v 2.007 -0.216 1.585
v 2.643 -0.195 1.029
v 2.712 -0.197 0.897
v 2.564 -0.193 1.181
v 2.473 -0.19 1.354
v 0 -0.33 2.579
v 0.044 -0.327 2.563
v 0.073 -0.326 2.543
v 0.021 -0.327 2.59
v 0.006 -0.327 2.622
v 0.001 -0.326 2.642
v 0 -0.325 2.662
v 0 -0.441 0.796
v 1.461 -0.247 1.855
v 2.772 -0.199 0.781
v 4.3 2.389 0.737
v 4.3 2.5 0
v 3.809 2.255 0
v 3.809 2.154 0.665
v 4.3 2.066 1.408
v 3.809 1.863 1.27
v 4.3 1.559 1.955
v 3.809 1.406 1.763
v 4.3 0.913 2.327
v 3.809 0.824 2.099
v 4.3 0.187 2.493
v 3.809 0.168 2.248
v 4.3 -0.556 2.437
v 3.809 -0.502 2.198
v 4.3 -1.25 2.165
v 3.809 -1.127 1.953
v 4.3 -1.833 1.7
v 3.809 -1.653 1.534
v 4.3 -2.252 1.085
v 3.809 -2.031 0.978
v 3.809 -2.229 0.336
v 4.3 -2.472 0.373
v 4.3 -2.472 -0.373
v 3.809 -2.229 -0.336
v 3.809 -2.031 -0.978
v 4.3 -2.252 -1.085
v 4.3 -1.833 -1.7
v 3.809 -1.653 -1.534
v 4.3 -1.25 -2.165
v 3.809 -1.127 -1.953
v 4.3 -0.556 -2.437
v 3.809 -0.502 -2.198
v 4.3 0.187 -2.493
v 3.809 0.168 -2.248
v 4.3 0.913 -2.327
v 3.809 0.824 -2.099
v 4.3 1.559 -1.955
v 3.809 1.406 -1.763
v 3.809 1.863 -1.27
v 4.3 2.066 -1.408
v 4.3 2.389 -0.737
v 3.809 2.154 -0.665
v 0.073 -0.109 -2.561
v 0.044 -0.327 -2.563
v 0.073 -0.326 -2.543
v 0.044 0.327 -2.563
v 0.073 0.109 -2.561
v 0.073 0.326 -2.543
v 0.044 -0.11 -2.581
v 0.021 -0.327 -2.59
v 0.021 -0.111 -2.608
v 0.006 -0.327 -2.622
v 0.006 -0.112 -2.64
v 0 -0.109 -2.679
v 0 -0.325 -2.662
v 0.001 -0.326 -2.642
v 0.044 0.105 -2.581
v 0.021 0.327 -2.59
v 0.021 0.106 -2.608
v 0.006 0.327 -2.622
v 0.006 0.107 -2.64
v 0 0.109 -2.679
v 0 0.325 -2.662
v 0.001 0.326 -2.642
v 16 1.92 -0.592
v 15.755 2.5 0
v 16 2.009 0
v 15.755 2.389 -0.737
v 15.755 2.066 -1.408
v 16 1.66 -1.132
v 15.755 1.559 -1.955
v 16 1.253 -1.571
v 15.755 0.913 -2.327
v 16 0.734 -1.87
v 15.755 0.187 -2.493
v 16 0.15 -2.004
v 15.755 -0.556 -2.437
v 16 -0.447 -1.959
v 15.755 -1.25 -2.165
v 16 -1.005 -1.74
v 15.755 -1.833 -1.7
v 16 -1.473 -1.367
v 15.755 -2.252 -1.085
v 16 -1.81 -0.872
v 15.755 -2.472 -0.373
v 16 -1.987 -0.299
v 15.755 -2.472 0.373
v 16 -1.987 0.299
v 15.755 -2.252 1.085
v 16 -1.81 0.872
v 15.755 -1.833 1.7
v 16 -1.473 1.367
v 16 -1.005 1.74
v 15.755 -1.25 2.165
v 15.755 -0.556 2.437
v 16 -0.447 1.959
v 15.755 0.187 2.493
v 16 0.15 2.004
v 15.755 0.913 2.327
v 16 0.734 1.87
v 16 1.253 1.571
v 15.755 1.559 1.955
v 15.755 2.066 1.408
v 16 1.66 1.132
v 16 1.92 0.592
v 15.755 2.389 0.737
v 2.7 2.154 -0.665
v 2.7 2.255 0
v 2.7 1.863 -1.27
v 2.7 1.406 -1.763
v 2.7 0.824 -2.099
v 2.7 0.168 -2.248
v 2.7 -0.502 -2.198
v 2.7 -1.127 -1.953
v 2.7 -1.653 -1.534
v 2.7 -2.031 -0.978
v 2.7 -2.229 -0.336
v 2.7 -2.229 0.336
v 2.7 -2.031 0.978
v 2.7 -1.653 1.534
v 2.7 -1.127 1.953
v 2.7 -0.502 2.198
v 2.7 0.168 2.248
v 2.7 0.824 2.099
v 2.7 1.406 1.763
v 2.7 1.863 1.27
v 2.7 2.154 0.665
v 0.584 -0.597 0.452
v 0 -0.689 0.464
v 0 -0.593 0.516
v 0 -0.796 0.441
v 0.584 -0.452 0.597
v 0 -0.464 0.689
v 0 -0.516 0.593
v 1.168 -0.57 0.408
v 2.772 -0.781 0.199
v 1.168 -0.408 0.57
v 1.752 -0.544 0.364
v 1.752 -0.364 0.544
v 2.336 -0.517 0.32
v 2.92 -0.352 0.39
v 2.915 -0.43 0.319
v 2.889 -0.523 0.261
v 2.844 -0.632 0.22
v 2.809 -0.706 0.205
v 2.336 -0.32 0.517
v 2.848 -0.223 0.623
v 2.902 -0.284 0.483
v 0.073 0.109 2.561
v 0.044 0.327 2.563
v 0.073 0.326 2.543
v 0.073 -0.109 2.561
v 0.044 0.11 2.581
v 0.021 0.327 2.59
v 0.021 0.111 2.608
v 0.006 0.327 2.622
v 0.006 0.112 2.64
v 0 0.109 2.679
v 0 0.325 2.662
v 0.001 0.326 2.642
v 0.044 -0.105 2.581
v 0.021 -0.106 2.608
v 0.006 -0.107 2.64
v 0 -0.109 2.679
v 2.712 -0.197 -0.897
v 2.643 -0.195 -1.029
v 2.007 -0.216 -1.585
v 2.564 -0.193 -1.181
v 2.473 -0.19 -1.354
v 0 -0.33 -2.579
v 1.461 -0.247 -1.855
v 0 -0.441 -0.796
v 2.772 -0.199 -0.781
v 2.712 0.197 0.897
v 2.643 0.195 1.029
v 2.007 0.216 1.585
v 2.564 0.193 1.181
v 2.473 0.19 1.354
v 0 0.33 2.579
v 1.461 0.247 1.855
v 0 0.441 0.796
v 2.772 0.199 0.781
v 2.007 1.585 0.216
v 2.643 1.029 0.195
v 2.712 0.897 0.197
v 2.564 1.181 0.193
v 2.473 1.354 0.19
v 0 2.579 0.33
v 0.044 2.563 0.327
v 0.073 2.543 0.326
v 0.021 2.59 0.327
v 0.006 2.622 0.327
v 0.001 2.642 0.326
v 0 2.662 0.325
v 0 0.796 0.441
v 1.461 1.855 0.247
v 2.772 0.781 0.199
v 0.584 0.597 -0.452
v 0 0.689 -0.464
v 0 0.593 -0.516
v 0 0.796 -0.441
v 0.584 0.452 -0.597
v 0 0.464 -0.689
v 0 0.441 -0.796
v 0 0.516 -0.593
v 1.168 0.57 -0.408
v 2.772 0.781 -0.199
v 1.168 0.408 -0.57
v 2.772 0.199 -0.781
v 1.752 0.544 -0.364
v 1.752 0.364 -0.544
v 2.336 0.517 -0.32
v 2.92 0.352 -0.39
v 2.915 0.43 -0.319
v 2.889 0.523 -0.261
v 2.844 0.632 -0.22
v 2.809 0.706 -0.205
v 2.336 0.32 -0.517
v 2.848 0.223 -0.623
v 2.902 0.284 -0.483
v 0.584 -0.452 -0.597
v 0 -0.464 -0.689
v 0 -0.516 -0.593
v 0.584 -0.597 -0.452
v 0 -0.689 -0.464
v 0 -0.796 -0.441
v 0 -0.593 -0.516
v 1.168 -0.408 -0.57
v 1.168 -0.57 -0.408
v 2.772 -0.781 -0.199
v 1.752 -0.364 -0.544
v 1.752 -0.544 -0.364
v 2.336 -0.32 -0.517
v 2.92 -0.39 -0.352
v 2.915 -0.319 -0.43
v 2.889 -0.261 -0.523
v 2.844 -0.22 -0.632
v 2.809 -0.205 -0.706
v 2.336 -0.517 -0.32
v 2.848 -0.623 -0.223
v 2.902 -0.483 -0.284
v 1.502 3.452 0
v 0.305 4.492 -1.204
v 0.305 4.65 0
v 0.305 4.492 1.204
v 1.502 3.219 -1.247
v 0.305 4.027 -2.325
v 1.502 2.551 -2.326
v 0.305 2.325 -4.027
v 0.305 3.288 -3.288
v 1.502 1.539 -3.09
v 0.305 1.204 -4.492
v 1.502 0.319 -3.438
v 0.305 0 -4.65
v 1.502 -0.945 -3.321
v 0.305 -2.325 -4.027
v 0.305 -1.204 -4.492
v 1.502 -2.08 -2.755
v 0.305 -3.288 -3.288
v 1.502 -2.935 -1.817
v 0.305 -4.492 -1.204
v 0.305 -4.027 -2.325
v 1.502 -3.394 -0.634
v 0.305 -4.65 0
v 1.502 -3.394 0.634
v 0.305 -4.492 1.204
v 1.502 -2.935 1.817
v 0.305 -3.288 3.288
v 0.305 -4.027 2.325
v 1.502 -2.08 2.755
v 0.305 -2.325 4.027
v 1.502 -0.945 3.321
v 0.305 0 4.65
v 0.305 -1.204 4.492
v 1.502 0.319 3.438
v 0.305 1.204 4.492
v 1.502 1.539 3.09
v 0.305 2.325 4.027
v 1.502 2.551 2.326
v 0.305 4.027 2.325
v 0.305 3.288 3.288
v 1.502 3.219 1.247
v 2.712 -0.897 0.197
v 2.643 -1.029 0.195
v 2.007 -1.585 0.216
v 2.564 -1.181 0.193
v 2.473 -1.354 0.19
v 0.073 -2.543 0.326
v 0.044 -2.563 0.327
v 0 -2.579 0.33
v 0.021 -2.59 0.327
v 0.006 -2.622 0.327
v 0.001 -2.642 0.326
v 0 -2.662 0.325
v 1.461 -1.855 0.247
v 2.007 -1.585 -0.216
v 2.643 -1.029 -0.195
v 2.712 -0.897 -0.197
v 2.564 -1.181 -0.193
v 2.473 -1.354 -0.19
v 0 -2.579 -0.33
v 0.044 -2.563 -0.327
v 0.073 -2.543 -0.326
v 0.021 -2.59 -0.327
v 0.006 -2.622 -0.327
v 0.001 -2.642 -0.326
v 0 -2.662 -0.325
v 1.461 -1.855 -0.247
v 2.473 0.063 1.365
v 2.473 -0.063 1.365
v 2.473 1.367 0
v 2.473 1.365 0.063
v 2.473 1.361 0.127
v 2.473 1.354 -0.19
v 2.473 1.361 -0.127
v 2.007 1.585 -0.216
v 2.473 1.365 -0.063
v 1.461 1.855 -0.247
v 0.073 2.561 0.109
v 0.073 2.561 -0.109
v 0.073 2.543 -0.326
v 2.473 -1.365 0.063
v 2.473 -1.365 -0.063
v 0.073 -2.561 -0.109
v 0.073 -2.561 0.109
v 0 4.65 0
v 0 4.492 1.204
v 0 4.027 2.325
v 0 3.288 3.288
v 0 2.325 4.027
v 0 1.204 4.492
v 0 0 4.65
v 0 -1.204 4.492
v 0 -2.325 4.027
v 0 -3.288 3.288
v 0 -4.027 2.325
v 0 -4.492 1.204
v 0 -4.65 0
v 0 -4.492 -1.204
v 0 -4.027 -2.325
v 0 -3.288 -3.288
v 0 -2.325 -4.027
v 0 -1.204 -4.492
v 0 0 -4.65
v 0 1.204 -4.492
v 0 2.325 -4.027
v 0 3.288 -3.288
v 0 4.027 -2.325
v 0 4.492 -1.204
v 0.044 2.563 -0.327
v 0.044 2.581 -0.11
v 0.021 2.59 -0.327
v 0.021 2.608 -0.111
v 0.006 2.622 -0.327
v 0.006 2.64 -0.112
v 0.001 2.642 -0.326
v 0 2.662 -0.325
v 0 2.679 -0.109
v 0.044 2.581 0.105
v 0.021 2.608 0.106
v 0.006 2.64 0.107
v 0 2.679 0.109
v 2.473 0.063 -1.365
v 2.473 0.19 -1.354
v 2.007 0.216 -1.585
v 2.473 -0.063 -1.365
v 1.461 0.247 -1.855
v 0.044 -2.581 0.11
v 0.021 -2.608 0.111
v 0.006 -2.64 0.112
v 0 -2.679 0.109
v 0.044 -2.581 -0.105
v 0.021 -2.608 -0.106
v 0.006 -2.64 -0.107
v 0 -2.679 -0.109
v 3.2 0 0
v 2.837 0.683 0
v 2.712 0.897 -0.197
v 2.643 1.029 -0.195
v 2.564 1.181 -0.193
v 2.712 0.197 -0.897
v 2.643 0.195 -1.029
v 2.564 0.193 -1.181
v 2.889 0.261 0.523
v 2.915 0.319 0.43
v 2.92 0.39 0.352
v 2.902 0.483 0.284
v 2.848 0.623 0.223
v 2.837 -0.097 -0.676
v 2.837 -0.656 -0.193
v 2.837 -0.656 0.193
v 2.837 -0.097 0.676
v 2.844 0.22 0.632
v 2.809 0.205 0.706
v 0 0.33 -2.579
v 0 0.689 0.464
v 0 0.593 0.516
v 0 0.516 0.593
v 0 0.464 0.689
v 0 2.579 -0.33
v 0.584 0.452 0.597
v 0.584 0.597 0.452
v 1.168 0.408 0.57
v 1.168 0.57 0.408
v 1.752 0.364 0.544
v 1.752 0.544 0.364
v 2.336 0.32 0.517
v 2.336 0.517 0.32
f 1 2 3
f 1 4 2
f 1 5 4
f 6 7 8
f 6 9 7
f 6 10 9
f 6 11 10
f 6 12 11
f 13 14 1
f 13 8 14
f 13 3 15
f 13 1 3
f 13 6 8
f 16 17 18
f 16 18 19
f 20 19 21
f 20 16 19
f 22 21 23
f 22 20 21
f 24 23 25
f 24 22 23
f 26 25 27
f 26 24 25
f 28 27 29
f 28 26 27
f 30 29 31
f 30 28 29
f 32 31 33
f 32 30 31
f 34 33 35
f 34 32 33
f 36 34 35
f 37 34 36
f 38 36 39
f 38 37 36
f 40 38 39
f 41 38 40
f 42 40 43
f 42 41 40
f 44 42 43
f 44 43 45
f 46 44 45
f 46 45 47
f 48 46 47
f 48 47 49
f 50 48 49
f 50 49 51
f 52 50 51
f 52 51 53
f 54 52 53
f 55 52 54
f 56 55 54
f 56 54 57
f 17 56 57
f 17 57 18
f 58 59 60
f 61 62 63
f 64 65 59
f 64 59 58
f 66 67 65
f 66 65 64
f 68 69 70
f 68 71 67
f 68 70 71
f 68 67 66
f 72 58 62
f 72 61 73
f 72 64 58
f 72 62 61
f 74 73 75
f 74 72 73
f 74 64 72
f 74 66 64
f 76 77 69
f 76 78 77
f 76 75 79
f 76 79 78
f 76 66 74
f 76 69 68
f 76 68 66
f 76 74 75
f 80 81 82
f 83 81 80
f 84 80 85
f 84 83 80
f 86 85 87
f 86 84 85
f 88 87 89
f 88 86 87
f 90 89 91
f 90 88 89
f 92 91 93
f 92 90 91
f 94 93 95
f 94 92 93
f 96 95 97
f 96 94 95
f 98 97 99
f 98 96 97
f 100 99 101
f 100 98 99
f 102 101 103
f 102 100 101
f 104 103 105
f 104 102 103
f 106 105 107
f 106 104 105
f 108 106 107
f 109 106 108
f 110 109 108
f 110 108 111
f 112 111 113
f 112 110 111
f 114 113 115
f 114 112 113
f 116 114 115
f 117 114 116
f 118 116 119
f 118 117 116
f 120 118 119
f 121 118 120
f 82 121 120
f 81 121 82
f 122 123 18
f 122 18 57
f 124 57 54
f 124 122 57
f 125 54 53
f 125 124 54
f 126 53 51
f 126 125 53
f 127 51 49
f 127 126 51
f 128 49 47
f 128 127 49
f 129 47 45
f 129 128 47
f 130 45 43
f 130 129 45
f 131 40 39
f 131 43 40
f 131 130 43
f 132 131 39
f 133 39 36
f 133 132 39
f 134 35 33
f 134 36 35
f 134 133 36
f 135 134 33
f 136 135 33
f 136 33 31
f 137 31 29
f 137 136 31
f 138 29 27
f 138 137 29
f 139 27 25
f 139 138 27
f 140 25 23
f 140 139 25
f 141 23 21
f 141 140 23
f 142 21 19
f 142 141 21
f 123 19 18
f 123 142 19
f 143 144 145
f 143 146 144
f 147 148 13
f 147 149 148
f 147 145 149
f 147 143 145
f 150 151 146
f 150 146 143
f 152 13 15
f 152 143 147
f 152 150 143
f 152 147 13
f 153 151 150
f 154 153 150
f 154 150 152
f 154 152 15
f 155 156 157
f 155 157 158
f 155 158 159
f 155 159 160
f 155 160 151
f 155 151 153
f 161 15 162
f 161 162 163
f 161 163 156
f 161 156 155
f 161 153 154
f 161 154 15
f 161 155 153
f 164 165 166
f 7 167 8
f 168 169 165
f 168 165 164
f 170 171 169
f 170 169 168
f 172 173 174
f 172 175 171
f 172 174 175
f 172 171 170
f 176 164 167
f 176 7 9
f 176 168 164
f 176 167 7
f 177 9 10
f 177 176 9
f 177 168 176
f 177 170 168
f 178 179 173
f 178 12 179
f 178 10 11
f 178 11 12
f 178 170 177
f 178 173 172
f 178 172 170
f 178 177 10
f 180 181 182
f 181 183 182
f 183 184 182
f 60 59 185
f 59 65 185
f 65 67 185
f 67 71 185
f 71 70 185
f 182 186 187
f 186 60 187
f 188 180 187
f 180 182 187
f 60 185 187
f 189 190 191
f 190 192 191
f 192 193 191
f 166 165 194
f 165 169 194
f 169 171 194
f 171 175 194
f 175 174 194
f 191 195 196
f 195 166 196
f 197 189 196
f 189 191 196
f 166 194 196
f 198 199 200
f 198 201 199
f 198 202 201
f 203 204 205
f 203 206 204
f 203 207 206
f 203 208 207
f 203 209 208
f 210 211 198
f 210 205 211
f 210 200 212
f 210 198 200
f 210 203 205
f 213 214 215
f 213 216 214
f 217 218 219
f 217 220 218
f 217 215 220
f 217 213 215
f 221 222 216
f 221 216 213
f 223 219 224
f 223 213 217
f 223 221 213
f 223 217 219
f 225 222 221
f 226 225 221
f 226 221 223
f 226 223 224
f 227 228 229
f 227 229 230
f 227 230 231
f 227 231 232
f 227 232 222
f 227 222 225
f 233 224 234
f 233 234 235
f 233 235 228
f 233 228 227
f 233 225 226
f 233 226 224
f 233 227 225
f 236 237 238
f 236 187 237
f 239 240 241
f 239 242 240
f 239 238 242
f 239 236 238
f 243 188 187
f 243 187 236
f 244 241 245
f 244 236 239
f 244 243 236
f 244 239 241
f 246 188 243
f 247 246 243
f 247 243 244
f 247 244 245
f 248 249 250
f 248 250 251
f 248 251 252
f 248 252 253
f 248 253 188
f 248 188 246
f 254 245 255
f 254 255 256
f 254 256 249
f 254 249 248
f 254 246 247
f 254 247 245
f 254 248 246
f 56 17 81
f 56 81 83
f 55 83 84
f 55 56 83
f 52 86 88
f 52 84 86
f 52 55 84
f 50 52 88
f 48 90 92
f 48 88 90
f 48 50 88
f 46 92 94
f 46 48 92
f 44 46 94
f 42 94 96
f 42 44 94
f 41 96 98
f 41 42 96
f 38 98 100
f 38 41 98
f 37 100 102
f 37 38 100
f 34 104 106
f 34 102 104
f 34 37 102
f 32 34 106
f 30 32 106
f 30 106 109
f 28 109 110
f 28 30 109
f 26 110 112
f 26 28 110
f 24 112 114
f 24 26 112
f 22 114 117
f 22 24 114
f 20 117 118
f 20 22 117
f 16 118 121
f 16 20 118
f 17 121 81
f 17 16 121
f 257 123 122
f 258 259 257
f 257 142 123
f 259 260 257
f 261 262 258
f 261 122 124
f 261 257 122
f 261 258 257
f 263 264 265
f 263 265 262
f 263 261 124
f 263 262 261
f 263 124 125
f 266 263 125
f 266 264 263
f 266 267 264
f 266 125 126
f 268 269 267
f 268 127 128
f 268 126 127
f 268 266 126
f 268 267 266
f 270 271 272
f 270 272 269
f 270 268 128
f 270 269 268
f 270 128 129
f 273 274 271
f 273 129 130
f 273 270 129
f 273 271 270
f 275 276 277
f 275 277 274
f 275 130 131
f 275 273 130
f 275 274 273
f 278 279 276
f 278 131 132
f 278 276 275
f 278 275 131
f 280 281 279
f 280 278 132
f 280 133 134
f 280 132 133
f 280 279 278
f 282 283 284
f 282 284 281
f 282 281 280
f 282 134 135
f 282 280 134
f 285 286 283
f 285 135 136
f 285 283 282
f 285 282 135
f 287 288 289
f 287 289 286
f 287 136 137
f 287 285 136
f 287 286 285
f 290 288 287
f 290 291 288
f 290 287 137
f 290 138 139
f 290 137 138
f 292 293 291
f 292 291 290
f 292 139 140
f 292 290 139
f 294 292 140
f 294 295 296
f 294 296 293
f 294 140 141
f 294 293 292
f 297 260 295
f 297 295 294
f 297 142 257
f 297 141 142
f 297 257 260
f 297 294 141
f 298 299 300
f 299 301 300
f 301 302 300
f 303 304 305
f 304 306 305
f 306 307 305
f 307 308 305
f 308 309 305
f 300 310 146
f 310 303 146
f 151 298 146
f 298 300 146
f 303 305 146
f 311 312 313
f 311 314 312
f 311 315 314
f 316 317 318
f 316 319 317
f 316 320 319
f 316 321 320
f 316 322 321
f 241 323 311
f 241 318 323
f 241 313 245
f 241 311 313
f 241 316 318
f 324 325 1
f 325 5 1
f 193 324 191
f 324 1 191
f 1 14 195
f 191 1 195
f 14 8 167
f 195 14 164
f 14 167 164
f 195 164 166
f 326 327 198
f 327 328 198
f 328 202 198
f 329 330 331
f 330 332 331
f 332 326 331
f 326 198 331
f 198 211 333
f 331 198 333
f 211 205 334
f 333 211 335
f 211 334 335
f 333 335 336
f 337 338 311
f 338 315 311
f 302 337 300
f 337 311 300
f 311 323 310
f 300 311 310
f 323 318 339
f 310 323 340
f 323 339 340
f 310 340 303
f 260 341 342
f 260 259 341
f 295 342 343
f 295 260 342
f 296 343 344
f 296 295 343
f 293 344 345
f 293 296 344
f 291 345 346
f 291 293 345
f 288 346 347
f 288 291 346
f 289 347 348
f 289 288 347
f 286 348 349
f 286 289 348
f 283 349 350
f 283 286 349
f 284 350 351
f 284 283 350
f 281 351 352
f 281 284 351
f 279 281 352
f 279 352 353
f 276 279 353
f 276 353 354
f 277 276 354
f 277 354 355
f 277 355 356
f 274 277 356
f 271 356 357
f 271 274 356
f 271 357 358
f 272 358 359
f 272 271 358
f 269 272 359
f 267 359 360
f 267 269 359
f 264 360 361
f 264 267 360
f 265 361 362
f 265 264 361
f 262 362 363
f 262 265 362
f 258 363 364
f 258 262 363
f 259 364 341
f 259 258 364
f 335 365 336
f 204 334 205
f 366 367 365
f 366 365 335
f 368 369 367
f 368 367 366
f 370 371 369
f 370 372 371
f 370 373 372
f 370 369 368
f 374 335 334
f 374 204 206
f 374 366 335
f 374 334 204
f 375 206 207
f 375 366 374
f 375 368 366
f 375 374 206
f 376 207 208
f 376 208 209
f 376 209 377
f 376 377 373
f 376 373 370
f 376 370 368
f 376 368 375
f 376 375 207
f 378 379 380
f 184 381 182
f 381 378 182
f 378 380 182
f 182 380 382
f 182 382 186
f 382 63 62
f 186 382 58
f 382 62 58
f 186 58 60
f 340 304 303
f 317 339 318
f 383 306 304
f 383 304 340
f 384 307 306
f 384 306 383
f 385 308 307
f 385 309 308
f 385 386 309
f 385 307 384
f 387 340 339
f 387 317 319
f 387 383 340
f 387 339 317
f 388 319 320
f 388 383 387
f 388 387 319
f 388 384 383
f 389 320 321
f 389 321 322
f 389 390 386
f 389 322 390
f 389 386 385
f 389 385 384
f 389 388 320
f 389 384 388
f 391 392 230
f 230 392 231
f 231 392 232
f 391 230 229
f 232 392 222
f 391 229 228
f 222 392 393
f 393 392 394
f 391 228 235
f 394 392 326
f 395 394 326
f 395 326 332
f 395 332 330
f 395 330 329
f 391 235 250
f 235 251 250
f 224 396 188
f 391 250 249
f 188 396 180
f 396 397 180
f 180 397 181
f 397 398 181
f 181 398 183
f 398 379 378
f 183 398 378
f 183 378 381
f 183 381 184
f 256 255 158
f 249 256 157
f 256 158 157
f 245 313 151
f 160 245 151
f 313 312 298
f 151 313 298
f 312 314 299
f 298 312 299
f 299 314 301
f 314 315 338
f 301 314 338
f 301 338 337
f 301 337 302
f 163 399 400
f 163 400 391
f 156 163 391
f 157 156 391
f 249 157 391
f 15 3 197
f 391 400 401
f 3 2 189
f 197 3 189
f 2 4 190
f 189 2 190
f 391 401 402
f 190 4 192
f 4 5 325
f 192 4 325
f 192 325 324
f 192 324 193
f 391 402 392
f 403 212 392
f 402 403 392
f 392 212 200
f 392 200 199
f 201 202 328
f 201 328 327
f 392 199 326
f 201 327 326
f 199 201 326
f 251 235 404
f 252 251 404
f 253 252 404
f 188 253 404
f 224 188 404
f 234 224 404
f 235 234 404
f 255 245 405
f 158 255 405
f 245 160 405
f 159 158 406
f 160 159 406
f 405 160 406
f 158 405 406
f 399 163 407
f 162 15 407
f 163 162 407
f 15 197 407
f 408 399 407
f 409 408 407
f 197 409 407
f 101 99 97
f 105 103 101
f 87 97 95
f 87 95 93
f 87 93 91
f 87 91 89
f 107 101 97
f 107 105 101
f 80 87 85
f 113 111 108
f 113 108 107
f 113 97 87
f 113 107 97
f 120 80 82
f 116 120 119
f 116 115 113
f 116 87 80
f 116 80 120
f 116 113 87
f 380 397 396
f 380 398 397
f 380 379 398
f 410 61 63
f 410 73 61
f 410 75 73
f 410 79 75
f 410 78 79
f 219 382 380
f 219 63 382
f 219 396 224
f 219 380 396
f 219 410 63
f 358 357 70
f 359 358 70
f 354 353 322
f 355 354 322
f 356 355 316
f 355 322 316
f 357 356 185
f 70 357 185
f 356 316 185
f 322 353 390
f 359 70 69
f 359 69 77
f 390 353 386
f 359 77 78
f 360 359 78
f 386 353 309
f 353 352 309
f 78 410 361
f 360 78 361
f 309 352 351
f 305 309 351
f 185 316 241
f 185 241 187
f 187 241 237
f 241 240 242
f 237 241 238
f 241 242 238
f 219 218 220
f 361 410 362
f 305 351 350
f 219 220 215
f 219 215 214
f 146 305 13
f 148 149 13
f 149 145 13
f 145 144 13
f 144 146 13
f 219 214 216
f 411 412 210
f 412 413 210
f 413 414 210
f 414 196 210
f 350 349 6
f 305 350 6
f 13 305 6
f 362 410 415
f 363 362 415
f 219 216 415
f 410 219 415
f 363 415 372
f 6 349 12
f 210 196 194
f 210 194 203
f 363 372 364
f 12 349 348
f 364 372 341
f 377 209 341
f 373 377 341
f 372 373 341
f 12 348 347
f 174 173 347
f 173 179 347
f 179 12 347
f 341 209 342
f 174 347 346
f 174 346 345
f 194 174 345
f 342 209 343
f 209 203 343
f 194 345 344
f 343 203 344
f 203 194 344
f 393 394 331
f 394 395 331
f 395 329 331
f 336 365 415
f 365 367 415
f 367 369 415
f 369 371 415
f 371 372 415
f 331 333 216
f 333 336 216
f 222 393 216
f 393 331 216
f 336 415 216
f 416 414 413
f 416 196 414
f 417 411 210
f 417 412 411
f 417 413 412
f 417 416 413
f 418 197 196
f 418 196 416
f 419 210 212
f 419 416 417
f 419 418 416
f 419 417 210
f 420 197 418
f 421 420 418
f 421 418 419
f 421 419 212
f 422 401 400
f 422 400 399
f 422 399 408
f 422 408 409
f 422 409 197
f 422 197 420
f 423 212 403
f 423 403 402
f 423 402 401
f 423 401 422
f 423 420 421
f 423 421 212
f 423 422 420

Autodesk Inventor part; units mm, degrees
ref_plane "YZ Plane" through (0, 0, 0) normal (1, 0, 0) x (0, 1, 0)
ref_plane "XZ Plane" through (0, 0, 0) normal (0, 1, 0) x (-1, 0, 0)
sketch "Sketch1" plane through (0, 0, 0) normal (0, 0, 1) x (1, 0, 0)
  line L0 (3.2, 0) -> (16, 0)
  line L1 (16, 0) -> (16, 2.5)
  line L2 (16, 2.5) -> (4.3, 2.5)
  line L3 (4.3, 2.5) -> (3.8092, 2.2546)
  line L4 (3.8092, 2.2546) -> (2.7, 2.2546)
  line L5 (0, 4.65) -> (0, 2.6)
  line L6 (0, 2.6) -> (2.4732, 1.3669)
  line L7 (2.4732, 1.3669) -> (3.2, 0)
  line L8 (-3.2, 0) -> (19.2, 0) projected
  line L9 (0, -0.93) -> (0, 5.58) projected
  line L10 (0, 4.65) -> (0.3046, 4.65)
  line L11 (0.3046, 4.65) -> (2.7, 2.2546)
  line L12 (4.3, 2.5) -> (2.4546, 2.5) construction
  dimension "d1" = 11.7
  dimension "d2" = 5
  dimension "d3" = 4.5092
  dimension "d4" = 5.2
  dimension "d5" = 26.5
  dimension "d6" = 62
  dimension "d7" = 3.2
  dimension "d8" = 0.4908
  dimension "d12" = 9.3
  dimension "d13" = 45
  dimension "d15" = 16
  dimension "d24" = 2.7
revolve "Body" add sketch "Sketch1" angle 360 about axis through (3.2, 0, 0) along (1, 0, 0) contours L7 L6 L5 L10 L11 L4 L3 L2 L1 L0
sketch "Sketch2" plane through (0, 0, 0) normal (-1, 0, 0) x (0, 0, 1)
  line L0 (0, 2.6) -> (0, 0) construction
  line L1 (0, 0) -> (2.6, 0) construction
  arc A0 (0.78, 0) -> (0, 0.78) centre (0, 0) ccw construction
  arc A1 (0.91, 0) -> (0, 0.91) centre (0, 0) ccw construction
  arc A2 (2.579, 0.33) -> (0.33, 2.579) centre (0, 0) ccw
  line L2 (0, 0) -> (1.8385, 1.8385) construction
  line L3 (0.33, 2.579) -> (0.4413, 0.7958)
  line L4 (2.579, 0.33) -> (0.7958, 0.4413)
  arc A3 (0.33, 2.579) -> (0, 2.6) centre (0, 0) ccw
  arc A4 (2.6, 0) -> (2.579, 0.33) centre (0, 0) ccw
  line L5 (0, -6.51) -> (0, 6.51) projected
  line L6 (-6.51, 0) -> (6.51, 0) projected
  arc A5 (0.33, -2.579) -> (2.579, -0.33) centre (0, 0) ccw
  line L7 (0.33, -2.579) -> (0.4413, -0.7958)
  line L8 (2.579, -0.33) -> (0.7958, -0.4413)
  arc A6 (0, -2.6) -> (0.33, -2.579) centre (0, 0) ccw
  arc A7 (2.579, -0.33) -> (2.6, 0) centre (0, 0) ccw
  arc A8 (-0.33, 2.579) -> (-2.579, 0.33) centre (0, 0) ccw
  line L9 (-0.33, 2.579) -> (-0.4413, 0.7958)
  line L10 (-2.579, 0.33) -> (-0.7958, 0.4413)
  arc A9 (0, 2.6) -> (-0.33, 2.579) centre (0, 0) ccw
  arc A10 (-2.579, 0.33) -> (-2.6, 0) centre (0, 0) ccw
  arc A11 (-0.33, -2.579) -> (0, -2.6) centre (0, 0) ccw
  arc A12 (-2.579, -0.33) -> (-0.33, -2.579) centre (0, 0) ccw
  arc A13 (-2.6, 0) -> (-2.579, -0.33) centre (0, 0) ccw
  line L11 (-2.579, -0.33) -> (-0.7958, -0.4413)
  line L12 (-0.33, -2.579) -> (-0.4413, -0.7958)
  arc A14 (0.4413, 0.7958) -> (0.7958, 0.4413) centre (0.8194, 0.8194) ccw
  arc A15 (0.7958, -0.4413) -> (0.4413, -0.7958) centre (0.8194, -0.8194) ccw
  arc A16 (-0.7958, 0.4413) -> (-0.4413, 0.7958) centre (-0.8194, 0.8194) ccw
  arc A17 (-0.4413, -0.7958) -> (-0.7958, -0.4413) centre (-0.8194, -0.8194) ccw
  point P0 (1.8385, -1.8385)
  point P1 (-1.8385, 1.8385)
  point P2 (-1.8385, -1.8385)
  dimension "d17" = 1.56
  dimension "d18" = 1.82
  dimension "d19" = 5.2
  dimension "d20" = 45
  dimension "d21" = 0.33
extrude "Slot" add sketch "Sketch2" against normal up to next draft 5 contours L4 A14 L3 A2 | A5 L7 A15 L8 | L9 A16 L10 A8 | A12 L11 A17 L12
fillet "Fillet1" radius 0.132 4 edges at (0, 2.6, 0) (0, 0, -2.6) (0, -2.6, 0) (0, 0, 2.6)
thread "Thread" size "M5x0.8" class "6g" standard "ISO Metric profile" length 11.7
chamfer "Chamfer1" distance 0.4908 distance2 0.2454 1 edges at (16, -2.5, 0) measured on face at (16, 0.2278, 0.5045)
ref_plane "Work Plane2" through (3.35, 0, 0) normal (0, 0, -1) x (1, 0, 0)
equation "\"d17\" = 0.3 * SDM"
equation "\"d18\" = 0.35 * SDM"
equation "\"d19\" = SDM"
equation "\"d21\" = 0.5 * SBR"
equation "\"d1\" = GEL"
equation "\"d2\" = GD"
equation "\"d3\" = BDM"
equation "\"d4\" = SDM"
equation "\"d7\" = INTI"
equation "\"d8\" = GAL"
equation "\"d12\" = KOD"
equation "\"d13\" = 0.5 * SEWI"
equation "\"d15\" = NLG"
equation "\"d24\" = KOH"
equation "\"d23\" = 0.2 * SBR"
equation "\"d10\" = GEL"
equation "\"d25\" = -0.5 * SPD + 0.5 * GD"
equation "\"d26\" = 0.5 * GAL"
equation "\"NLG\" = 16"
equation "\"GEL\" = 11.7"
equation "\"GAL\" = 0.61345 * PTC"
equation "\"SPD\" = NND - 1.2269 * PTC"
equation "\"KOD\" = 9.3"
equation "\"KOH\" = 2.7"
equation "\"SBR\" = 0.66"
equation "\"INTI\" = 3.2"
equation "\"SDM\" = 5.2"
equation "\"GD\" = NND"
equation "\"BDM\" = NND - GAL"
equation "\"SEWI\" = 90deg"
equation "\"d9\" = SDM"
equation "\"GUL\" = 0.61345 * PTC"
equation "\"TOA\" = 30deg"
equation "\"EPV\" = 5.2"
equation "\"THREADDIA\" = 5"
equation "\"PTC\" = 0.8"
equation "\"NND\" = 5"
equation "\"GD1\" = THREADDIA - 1.2269 * PTC"
properties part number "ISO 7046-1 - M5 x 16 - 4.8 - H" material "Steel"
